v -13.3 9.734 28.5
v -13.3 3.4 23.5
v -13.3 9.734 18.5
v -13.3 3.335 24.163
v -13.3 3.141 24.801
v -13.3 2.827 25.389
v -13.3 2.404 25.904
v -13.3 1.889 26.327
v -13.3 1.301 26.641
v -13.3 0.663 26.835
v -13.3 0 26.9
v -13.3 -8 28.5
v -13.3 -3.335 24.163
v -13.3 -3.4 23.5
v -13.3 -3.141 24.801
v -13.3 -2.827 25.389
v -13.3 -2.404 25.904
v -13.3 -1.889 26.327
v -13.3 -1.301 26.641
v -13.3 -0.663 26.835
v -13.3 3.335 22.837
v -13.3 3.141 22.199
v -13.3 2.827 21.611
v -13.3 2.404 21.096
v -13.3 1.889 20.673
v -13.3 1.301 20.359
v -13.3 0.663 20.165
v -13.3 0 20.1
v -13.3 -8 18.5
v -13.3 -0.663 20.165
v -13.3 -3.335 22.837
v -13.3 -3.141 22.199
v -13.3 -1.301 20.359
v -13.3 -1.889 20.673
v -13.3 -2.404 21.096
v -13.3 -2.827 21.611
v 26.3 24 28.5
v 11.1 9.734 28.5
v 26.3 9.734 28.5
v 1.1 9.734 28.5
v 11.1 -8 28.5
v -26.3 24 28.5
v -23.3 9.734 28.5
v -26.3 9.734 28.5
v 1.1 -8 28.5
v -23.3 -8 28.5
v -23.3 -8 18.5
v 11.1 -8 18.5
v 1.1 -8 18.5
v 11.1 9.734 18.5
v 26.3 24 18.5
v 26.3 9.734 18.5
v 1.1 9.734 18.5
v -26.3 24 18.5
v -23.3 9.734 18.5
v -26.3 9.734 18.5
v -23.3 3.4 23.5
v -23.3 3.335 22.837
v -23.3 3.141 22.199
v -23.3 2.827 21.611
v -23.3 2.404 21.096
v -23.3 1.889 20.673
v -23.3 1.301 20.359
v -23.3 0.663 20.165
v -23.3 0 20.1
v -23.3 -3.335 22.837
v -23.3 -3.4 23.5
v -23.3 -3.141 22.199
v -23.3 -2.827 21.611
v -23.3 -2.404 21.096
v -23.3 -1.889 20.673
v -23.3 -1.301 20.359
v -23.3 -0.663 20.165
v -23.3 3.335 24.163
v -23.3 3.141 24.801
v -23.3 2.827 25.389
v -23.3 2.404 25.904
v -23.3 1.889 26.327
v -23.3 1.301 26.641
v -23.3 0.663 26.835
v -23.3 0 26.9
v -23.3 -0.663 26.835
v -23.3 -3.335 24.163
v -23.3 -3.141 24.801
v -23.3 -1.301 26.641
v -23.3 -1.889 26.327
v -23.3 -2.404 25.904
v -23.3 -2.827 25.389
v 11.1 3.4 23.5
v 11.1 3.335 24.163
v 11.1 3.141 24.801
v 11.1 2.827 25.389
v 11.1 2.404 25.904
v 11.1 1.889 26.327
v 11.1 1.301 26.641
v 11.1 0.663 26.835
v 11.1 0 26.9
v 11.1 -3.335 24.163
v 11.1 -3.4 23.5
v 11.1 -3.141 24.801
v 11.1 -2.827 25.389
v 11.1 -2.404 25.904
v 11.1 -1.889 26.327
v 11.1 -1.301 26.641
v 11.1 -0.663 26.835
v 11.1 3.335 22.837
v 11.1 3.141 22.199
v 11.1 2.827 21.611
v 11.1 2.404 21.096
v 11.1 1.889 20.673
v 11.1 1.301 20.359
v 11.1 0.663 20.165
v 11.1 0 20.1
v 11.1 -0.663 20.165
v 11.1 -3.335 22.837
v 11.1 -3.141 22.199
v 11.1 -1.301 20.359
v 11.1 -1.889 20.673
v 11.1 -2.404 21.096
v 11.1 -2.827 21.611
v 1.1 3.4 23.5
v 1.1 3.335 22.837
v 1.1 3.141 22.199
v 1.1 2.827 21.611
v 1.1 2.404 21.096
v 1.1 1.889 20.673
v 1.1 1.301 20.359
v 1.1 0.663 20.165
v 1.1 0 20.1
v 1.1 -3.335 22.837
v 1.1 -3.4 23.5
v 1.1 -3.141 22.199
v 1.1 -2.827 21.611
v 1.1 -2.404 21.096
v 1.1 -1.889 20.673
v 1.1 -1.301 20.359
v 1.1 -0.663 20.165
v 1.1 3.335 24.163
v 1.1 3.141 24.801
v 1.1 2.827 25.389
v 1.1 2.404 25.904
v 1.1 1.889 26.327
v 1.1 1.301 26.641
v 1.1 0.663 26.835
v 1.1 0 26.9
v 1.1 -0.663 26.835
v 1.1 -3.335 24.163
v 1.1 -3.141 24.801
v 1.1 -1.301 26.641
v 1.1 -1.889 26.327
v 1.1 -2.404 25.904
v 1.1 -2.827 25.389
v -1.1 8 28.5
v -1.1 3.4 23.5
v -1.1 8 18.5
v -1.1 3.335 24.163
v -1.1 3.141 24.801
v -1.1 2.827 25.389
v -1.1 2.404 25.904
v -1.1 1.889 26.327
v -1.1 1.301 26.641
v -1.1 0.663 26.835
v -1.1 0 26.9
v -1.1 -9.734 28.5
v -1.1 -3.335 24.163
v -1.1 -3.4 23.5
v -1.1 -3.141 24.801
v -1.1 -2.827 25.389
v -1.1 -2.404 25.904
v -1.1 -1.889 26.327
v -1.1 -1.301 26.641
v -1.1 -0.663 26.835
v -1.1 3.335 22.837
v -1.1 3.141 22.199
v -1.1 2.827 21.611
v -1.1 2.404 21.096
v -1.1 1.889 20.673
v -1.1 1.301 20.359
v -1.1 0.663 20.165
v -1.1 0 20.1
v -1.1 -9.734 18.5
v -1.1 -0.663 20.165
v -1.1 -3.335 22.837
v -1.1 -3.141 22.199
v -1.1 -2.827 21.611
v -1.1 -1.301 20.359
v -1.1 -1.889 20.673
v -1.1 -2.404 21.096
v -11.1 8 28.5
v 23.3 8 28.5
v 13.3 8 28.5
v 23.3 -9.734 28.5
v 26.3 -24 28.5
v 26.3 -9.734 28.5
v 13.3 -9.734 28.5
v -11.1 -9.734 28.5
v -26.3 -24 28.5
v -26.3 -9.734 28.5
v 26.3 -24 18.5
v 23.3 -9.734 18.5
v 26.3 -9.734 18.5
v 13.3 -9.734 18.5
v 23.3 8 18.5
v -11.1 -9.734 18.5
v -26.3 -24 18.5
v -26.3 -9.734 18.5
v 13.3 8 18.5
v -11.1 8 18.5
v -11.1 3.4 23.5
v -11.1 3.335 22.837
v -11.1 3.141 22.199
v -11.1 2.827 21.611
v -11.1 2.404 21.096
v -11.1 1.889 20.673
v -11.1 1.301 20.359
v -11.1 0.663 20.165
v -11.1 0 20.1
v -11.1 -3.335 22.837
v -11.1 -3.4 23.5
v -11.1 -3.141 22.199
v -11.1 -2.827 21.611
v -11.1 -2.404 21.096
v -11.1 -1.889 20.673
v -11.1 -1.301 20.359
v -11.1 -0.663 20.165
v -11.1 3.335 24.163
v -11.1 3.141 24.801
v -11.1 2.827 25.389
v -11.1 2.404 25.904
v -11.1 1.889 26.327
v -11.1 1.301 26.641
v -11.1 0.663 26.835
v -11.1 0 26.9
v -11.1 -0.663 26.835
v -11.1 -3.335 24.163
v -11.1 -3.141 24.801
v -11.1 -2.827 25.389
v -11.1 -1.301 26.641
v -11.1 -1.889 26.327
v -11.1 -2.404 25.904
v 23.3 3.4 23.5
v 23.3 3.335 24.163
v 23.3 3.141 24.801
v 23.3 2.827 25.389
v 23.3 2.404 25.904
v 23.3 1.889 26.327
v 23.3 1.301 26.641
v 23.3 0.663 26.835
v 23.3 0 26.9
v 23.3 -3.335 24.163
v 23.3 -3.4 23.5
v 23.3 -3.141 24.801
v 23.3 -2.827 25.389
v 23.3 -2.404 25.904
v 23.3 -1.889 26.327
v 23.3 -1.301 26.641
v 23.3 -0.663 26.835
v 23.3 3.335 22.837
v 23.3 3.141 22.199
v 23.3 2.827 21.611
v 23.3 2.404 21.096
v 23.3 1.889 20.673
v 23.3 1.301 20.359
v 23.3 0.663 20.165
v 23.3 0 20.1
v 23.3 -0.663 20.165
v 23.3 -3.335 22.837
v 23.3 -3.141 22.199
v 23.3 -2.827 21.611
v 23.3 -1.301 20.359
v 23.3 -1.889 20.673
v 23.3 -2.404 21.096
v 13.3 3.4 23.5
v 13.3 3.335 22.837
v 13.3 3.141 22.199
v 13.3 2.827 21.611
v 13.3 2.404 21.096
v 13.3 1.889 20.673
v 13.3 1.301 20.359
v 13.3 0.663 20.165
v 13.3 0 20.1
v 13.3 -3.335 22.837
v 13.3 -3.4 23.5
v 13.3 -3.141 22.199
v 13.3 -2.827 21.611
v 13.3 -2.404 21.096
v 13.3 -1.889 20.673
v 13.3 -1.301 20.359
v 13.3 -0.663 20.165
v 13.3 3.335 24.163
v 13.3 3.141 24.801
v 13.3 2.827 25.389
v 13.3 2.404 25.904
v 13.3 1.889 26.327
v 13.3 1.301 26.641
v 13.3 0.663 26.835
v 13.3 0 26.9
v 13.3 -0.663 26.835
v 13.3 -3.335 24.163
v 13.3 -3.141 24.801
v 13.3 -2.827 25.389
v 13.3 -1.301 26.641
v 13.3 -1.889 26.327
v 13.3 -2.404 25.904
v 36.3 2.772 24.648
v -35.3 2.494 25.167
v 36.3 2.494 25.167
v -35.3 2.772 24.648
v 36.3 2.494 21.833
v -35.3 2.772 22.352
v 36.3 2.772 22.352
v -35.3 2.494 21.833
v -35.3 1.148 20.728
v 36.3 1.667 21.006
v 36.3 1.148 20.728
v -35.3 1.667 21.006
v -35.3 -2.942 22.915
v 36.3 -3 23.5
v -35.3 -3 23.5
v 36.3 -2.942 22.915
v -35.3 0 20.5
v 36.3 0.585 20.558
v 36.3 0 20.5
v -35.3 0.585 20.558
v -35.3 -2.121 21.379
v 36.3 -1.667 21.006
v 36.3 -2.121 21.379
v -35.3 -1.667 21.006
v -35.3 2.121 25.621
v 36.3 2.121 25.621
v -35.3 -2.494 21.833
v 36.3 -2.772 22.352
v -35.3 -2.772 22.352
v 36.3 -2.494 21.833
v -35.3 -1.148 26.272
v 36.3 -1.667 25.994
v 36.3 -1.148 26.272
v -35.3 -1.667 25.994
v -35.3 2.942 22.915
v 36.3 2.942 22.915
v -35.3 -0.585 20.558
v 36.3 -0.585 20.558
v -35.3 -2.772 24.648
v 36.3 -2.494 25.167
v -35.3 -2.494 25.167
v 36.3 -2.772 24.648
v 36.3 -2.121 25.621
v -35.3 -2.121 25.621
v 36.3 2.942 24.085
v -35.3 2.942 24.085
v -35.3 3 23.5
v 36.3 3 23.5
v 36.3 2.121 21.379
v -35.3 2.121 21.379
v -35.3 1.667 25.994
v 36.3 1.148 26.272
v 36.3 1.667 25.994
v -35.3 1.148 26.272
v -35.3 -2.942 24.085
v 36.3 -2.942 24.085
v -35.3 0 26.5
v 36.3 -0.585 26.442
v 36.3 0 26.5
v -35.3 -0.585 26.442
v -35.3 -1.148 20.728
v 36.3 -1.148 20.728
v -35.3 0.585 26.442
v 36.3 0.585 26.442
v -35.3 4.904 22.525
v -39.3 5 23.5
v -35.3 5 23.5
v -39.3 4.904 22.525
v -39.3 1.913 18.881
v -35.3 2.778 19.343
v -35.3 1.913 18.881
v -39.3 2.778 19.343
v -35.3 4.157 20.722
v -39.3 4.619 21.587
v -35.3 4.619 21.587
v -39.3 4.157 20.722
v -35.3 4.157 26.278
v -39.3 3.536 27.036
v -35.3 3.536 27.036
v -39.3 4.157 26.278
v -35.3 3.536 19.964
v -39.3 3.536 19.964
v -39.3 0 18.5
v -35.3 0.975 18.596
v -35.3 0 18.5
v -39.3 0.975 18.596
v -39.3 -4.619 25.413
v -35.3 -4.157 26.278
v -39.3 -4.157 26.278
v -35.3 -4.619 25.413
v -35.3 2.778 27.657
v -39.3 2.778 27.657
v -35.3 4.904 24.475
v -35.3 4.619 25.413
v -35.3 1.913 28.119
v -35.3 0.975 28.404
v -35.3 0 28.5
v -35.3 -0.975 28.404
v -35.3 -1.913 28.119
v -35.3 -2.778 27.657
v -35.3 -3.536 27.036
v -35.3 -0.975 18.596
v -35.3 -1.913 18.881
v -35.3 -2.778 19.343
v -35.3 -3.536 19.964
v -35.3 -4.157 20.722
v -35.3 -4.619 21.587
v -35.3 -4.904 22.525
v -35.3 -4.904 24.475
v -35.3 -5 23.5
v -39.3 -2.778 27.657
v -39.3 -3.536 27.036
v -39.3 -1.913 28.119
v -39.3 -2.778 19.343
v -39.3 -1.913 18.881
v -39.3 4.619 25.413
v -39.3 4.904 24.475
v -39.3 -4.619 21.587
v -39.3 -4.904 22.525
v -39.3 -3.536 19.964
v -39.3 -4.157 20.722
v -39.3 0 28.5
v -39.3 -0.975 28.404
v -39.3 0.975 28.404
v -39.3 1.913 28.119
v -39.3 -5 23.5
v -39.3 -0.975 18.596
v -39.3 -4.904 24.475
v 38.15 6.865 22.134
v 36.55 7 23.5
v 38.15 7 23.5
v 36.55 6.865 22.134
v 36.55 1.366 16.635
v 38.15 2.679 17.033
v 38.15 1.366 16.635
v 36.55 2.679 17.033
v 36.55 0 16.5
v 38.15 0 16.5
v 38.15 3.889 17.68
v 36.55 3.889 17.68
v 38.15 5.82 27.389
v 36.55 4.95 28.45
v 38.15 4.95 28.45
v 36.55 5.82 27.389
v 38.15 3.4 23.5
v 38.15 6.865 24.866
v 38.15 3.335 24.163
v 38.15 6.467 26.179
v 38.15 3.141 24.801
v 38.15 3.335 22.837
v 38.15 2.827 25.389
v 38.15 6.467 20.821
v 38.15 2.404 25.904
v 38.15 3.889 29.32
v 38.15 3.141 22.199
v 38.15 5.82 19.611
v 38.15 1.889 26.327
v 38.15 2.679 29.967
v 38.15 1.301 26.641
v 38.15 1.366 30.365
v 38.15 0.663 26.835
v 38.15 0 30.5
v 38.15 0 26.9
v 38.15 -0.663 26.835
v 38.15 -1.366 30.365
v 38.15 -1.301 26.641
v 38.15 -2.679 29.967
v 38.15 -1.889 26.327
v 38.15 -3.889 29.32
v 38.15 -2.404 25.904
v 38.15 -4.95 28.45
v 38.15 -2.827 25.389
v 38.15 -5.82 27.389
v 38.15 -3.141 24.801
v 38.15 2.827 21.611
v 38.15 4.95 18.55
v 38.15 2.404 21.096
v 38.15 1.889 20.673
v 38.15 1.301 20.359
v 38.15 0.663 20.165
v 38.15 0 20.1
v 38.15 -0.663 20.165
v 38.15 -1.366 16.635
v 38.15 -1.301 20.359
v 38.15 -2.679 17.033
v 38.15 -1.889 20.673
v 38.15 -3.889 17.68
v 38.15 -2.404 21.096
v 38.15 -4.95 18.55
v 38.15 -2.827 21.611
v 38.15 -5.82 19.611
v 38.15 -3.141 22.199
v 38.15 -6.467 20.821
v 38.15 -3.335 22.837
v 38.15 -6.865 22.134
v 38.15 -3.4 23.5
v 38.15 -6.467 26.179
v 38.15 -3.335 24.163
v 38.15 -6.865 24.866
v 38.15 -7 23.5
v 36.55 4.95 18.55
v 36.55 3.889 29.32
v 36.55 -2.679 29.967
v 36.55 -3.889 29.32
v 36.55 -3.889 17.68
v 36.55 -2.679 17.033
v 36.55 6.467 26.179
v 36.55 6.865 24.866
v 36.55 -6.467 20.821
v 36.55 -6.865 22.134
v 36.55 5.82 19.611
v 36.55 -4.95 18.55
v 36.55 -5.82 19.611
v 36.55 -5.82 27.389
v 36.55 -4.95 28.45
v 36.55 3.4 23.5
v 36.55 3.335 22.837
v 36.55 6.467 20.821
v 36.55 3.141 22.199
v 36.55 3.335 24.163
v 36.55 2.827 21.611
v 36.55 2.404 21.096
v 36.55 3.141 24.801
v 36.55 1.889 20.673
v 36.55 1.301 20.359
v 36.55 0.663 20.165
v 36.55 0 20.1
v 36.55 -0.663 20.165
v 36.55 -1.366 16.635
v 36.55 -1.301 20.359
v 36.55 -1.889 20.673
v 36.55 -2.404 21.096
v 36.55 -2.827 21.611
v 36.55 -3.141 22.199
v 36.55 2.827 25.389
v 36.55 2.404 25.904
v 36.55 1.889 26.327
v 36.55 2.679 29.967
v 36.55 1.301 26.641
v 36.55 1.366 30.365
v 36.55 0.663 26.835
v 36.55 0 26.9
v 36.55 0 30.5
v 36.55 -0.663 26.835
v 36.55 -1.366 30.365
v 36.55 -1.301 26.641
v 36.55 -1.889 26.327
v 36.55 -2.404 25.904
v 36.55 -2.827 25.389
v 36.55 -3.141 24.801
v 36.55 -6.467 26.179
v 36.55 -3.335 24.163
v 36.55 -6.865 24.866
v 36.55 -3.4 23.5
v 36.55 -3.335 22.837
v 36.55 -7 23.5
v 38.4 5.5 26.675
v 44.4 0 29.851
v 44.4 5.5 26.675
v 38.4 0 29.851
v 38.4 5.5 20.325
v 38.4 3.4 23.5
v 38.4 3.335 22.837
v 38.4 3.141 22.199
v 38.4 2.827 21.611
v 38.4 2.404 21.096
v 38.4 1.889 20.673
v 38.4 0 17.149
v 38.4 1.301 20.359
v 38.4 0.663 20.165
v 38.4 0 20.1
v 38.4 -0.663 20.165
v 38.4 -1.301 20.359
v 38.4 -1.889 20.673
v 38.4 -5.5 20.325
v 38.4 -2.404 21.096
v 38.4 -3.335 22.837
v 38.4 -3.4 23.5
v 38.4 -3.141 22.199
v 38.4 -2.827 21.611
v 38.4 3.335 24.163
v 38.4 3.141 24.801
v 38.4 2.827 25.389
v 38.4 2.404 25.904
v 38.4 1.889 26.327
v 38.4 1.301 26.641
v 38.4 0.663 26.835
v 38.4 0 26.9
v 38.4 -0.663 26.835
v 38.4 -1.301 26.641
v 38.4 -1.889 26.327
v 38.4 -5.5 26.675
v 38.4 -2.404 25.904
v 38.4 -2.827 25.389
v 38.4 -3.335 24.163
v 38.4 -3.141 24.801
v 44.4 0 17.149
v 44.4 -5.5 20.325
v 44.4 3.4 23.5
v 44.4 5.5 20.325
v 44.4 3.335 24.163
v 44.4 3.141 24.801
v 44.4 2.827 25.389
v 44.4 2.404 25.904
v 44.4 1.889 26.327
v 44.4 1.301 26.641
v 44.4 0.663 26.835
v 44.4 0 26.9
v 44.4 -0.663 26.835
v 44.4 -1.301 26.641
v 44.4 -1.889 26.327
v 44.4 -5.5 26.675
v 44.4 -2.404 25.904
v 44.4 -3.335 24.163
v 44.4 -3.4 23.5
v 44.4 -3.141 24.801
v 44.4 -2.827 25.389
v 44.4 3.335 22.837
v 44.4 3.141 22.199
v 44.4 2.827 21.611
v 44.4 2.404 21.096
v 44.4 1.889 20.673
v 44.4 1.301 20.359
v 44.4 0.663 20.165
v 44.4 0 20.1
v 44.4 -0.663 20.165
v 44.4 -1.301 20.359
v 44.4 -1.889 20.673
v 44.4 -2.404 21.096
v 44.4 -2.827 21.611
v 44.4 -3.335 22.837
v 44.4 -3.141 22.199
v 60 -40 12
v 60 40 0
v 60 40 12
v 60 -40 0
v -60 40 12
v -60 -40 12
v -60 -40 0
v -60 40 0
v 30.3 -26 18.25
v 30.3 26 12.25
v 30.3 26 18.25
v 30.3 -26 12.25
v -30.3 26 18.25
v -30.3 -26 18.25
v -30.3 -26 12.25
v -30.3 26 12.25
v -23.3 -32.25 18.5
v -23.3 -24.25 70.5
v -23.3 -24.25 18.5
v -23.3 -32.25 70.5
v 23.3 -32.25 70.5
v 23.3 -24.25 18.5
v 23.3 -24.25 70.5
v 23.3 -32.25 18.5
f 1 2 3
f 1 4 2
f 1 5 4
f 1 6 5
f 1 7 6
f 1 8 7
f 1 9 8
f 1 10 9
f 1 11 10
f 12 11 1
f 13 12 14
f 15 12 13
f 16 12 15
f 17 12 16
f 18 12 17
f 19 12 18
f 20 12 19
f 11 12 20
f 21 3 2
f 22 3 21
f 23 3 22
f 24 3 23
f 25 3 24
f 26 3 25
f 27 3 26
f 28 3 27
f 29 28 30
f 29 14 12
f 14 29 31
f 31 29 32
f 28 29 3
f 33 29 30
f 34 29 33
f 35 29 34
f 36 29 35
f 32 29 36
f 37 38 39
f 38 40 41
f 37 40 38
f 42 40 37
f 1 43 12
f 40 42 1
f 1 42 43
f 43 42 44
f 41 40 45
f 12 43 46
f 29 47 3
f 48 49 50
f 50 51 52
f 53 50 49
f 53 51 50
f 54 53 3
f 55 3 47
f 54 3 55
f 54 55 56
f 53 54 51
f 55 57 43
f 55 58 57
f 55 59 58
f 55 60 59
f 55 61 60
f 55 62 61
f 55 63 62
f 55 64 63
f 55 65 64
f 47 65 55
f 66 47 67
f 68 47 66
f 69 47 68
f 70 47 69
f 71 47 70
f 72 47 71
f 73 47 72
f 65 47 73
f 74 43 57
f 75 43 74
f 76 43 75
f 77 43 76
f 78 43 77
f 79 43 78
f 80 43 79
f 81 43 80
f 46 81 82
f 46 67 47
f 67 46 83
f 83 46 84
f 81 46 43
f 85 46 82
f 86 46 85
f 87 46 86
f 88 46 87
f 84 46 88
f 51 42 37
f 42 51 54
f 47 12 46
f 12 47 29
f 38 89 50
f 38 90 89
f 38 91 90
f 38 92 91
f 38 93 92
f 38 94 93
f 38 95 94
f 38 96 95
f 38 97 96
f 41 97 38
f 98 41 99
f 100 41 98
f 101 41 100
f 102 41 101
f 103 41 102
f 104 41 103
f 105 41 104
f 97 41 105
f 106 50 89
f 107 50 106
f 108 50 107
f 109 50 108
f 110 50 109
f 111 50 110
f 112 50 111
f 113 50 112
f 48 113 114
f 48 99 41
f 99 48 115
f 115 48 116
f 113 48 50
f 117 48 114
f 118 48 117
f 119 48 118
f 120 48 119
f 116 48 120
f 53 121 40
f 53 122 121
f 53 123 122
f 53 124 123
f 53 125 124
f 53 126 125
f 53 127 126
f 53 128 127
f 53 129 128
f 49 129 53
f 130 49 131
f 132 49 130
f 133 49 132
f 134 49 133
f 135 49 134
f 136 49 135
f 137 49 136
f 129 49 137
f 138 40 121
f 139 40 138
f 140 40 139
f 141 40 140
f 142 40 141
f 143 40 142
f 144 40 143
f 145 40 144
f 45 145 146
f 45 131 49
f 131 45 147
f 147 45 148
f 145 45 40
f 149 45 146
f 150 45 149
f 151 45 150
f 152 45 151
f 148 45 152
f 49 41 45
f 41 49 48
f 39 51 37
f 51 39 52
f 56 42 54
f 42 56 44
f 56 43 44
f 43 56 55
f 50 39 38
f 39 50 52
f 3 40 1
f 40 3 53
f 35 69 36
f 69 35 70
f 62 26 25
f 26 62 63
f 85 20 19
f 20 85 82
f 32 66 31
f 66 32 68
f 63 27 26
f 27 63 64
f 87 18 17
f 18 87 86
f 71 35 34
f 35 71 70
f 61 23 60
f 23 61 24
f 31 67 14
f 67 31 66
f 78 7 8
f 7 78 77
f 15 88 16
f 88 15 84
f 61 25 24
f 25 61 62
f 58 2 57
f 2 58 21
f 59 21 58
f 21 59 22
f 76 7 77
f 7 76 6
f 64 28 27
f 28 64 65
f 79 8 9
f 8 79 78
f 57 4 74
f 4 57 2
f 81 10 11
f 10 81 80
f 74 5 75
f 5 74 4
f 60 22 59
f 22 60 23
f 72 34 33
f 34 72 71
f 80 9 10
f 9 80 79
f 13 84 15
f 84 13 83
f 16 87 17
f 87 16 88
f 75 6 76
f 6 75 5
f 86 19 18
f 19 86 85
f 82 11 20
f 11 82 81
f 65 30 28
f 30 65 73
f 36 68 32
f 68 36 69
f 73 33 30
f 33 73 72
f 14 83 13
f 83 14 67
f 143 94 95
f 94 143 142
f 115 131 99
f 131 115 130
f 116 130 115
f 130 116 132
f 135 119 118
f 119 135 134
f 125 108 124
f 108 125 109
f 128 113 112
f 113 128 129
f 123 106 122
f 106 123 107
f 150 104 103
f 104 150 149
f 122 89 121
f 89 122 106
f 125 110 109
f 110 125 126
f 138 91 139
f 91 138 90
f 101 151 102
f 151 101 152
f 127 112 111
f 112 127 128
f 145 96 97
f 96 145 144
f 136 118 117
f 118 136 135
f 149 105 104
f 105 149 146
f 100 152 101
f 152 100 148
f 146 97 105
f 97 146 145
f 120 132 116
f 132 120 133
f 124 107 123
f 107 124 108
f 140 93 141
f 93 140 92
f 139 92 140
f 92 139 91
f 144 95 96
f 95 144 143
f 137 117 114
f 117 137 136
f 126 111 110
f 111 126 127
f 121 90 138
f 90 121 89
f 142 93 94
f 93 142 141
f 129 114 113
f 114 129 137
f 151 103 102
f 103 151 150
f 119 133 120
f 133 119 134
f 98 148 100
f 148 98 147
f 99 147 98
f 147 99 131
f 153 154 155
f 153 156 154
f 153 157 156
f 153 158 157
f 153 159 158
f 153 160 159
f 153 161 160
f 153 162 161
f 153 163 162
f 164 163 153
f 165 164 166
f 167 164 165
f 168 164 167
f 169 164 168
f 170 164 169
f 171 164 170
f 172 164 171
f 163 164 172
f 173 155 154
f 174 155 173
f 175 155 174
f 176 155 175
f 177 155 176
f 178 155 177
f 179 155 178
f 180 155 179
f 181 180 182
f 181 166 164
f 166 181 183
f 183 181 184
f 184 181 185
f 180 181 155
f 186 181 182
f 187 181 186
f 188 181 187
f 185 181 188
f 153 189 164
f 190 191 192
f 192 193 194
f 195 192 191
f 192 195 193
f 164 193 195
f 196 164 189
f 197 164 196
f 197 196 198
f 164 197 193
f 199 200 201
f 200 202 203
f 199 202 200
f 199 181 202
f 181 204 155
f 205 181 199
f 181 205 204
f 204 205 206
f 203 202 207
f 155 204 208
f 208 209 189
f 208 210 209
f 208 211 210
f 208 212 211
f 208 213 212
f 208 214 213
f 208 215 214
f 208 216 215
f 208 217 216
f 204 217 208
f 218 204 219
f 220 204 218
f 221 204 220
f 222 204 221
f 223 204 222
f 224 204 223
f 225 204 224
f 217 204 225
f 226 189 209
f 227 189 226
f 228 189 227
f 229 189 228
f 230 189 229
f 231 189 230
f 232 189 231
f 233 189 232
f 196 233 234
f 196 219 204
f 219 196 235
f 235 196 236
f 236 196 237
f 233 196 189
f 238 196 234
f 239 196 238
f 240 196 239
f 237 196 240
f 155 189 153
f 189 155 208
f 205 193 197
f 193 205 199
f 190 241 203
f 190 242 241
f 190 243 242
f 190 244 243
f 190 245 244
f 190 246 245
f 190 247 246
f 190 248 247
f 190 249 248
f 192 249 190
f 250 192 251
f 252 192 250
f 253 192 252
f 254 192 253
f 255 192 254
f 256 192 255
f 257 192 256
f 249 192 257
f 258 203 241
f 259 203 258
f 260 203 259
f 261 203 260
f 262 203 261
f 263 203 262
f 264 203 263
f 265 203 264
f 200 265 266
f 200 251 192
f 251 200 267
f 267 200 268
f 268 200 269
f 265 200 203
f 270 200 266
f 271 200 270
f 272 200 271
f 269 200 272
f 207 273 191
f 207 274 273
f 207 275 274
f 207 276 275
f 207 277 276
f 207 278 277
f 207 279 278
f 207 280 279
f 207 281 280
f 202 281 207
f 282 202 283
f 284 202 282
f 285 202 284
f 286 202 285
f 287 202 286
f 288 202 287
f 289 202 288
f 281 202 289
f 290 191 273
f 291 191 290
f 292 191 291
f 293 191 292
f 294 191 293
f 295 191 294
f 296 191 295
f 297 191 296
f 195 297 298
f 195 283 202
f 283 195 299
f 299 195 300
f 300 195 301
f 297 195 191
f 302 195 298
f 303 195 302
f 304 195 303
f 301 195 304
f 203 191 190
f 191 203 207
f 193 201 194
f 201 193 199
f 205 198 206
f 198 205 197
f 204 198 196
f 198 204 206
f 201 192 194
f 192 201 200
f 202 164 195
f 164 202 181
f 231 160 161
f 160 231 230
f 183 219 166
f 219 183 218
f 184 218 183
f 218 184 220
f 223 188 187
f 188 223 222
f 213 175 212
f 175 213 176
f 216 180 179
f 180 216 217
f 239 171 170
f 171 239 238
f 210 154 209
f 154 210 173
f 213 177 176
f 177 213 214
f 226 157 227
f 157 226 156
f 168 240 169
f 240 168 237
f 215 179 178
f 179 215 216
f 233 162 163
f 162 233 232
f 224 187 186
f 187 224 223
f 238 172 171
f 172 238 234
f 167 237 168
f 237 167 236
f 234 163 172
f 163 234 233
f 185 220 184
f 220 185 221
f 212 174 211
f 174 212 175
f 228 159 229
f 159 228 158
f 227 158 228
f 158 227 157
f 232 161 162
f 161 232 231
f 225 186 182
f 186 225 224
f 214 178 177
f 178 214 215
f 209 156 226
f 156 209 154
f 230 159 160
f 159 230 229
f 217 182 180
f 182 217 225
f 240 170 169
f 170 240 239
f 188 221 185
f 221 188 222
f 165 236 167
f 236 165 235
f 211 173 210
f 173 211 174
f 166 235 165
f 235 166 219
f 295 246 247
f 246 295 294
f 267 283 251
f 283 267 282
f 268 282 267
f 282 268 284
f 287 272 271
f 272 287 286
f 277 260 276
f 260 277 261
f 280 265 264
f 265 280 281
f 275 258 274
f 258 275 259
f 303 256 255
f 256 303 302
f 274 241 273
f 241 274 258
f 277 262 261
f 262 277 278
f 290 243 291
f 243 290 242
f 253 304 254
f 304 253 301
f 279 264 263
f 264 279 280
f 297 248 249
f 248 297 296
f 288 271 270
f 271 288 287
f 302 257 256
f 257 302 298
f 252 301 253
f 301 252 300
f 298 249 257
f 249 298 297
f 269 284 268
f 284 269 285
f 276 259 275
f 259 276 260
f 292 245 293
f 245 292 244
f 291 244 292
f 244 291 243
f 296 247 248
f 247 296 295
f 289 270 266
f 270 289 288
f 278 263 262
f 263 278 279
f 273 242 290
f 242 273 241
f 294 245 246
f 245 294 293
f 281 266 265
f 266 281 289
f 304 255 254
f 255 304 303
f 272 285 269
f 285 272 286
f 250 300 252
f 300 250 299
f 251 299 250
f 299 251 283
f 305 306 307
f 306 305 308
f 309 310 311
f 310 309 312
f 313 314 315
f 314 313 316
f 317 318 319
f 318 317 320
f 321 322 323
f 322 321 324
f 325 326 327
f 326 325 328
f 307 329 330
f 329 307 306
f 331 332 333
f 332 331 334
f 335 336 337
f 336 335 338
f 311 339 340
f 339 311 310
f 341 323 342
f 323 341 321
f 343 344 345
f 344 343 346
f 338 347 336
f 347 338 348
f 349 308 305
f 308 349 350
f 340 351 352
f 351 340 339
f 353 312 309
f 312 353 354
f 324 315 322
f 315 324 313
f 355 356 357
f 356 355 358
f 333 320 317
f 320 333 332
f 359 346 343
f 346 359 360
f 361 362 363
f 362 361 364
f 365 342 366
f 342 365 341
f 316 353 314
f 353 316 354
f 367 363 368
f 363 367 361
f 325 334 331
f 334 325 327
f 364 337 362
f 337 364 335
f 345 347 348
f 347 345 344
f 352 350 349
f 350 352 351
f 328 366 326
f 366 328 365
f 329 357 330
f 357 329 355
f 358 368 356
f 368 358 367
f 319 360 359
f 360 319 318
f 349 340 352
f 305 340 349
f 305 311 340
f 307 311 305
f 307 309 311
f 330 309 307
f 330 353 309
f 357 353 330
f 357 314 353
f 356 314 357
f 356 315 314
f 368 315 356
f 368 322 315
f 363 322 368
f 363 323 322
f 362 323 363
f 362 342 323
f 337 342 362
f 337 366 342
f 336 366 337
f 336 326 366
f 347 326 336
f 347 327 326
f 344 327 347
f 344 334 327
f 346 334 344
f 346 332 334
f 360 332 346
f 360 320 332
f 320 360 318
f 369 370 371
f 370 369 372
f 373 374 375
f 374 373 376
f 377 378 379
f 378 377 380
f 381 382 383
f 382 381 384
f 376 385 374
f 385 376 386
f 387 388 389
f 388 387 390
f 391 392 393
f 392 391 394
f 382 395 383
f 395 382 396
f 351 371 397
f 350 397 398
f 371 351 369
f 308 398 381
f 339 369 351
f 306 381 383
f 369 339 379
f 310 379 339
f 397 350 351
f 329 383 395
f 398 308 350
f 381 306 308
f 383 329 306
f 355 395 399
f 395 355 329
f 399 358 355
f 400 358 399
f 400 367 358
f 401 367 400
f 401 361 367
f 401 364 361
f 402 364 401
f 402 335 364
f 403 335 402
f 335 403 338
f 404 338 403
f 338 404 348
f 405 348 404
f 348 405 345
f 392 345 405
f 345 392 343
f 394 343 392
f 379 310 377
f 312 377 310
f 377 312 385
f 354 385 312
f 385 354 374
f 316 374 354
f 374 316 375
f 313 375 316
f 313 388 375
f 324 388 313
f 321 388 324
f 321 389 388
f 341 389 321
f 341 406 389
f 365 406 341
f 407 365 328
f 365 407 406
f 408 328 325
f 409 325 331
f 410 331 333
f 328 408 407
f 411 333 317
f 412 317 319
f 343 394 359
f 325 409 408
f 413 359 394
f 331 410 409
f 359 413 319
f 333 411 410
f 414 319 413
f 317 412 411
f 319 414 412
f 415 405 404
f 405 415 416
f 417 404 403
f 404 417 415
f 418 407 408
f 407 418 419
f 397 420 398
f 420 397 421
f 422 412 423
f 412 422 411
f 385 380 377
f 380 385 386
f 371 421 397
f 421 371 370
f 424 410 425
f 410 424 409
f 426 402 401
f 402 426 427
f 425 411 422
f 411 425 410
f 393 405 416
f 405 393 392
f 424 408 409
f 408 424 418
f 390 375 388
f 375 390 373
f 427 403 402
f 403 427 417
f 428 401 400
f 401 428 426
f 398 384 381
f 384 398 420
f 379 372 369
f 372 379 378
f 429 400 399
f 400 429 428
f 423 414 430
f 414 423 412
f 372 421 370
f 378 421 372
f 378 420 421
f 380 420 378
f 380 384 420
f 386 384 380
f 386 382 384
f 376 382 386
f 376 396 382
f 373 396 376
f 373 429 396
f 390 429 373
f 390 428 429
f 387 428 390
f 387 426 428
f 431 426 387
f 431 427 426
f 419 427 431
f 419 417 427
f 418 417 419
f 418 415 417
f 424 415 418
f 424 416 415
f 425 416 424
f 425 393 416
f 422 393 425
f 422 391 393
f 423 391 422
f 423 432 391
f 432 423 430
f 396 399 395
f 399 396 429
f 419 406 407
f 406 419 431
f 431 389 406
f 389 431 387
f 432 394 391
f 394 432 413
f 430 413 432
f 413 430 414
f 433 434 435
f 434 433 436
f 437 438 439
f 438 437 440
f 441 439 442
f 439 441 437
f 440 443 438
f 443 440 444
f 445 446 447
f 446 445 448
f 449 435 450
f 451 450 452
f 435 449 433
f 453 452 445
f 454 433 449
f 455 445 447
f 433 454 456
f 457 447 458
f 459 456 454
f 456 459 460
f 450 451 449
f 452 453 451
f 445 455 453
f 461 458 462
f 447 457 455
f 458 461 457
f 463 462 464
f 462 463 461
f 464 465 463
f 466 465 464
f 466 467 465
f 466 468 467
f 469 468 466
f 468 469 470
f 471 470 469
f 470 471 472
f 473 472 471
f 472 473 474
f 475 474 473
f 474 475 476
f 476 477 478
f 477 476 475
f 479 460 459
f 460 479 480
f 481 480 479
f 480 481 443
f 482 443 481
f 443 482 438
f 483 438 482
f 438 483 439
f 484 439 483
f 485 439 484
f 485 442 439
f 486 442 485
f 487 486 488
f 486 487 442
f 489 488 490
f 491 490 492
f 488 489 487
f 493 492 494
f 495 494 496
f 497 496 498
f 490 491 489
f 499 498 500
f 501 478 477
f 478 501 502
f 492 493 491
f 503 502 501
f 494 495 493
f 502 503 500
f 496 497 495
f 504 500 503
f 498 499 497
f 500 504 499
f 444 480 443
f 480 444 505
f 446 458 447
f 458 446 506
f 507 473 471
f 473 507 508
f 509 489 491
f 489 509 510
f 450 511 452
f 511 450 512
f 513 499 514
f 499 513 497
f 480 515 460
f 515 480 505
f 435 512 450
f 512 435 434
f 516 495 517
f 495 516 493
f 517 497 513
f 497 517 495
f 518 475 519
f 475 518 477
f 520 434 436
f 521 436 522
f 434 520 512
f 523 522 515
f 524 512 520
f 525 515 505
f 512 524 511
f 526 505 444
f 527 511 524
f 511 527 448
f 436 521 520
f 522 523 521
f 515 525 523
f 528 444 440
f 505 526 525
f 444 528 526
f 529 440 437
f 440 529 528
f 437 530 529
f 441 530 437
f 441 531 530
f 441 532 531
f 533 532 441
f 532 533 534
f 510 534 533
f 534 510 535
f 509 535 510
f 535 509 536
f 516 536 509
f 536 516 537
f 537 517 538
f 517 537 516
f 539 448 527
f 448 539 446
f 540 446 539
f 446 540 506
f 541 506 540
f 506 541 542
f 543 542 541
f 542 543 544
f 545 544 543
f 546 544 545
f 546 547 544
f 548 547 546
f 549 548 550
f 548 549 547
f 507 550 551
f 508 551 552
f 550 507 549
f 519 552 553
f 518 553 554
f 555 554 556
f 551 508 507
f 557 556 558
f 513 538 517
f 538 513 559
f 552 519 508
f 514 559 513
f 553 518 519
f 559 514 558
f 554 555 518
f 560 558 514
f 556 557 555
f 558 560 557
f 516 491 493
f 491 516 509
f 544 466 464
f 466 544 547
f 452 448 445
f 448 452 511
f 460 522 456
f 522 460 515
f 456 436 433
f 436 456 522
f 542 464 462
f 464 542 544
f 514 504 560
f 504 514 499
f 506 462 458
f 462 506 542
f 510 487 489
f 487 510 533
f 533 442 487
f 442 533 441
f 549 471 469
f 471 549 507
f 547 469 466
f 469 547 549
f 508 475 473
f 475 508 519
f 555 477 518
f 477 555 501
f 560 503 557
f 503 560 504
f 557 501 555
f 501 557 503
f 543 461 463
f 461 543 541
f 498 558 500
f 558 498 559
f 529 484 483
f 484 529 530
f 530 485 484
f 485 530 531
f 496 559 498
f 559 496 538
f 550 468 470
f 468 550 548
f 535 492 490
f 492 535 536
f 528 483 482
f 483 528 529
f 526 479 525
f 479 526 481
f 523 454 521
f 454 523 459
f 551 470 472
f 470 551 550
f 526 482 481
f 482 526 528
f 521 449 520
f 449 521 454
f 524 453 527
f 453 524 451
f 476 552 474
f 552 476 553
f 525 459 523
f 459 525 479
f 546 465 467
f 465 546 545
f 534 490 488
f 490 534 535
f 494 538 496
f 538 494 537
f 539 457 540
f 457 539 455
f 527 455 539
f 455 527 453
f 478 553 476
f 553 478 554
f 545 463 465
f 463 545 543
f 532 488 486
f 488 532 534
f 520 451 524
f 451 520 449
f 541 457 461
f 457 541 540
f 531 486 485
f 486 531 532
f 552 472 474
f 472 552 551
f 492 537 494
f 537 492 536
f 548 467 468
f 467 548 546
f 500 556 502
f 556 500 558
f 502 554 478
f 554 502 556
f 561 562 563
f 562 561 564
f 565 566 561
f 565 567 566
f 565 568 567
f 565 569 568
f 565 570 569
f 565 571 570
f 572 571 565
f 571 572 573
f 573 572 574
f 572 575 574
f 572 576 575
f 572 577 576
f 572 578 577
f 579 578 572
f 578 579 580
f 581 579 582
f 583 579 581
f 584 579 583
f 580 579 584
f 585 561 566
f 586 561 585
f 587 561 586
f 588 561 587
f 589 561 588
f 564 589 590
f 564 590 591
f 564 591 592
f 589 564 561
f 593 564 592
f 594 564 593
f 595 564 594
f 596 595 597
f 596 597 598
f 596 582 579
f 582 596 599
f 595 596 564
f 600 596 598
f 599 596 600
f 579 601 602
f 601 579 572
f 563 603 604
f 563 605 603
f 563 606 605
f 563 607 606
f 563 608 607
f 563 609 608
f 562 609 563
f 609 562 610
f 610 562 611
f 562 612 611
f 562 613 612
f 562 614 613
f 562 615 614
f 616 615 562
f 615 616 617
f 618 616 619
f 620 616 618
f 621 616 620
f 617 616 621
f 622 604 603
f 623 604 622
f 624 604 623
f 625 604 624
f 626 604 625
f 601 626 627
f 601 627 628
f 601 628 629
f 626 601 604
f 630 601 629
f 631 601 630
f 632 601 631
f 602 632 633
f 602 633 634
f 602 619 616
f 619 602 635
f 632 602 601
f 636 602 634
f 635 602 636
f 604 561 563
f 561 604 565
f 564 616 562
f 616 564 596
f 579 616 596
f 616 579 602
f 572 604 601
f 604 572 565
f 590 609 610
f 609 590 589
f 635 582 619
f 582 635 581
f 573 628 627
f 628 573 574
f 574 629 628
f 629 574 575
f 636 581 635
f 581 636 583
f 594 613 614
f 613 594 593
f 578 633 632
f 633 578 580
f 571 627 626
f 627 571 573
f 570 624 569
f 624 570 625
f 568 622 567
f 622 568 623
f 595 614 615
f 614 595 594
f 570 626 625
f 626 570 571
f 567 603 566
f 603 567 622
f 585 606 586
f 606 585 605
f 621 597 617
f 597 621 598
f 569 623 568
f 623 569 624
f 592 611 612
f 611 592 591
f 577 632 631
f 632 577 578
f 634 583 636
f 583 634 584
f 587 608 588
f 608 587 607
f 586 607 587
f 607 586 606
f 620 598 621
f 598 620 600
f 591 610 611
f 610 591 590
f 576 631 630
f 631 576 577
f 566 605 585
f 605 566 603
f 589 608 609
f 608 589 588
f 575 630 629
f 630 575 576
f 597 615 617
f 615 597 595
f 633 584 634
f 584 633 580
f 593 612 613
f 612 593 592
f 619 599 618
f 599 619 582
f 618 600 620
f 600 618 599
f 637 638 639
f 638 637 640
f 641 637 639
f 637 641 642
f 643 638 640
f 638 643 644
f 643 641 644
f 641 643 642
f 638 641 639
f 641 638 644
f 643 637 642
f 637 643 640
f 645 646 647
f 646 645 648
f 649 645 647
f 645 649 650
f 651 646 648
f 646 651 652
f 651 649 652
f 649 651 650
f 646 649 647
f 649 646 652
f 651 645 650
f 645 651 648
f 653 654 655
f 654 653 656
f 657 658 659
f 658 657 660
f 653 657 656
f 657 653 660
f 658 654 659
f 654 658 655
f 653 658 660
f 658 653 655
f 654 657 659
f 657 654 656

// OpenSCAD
$fn = 32;

// ------------------------------------------------------------------------
// Comb hinge with flap: leaf 52.6 x 24 mm, pin d6, flap 52 mm
// Every part is its own module, assembly() places every instance.
// ------------------------------------------------------------------------

// --- part 1 ---
module hinge_bed() {
  difference() {
    translate([-60, -40, 0]) cube([120, 80, 12]);
  }
}

// --- part 2 ---
module hinge_riser() {
  difference() {
    translate([-30.3, -26, 0]) cube([60.6, 52, 6]);
  }
}

// --- part 3 ---
module hinge_leaf_a() {
  difference() {
    union() {
      translate([-23.3, -8, -5]) cube([10, 32, 10]);
      translate([1.1, -8, -5]) cube([10, 32, 10]);
      translate([-26.3, 9.734, -5]) cube([52.6, 14.266, 10]);
    }
    translate([-18.3, 0, 0]) rotate([0, 90, 0]) cylinder(h = 12, d = 6.8, center = true);
    translate([6.1, 0, 0]) rotate([0, 90, 0]) cylinder(h = 12, d = 6.8, center = true);
  }
}

// --- part 4 ---
module hinge_leaf_b() {
  difference() {
    union() {
      translate([-11.1, -24, -5]) cube([10, 32, 10]);
      translate([13.3, -24, -5]) cube([10, 32, 10]);
      translate([-26.3, -24, -5]) cube([52.6, 14.266, 10]);
    }
    translate([-6.1, 0, 0]) rotate([0, 90, 0]) cylinder(h = 12, d = 6.8, center = true);
    translate([18.3, 0, 0]) rotate([0, 90, 0]) cylinder(h = 12, d = 6.8, center = true);
  }
}

// --- part 5 ---
module hinge_flap() {
  difference() {
    translate([-23.3, -26, 0]) cube([46.6, 52, 8]);
  }
}

// --- part 6 ---
module hinge_pin() {
  rotate([0, 90, 0]) cylinder(h = 72.6, d = 6, center = true);
  translate([-39.3, 0, 0]) rotate([0, 90, 0]) cylinder(h = 4, d = 10);
}

// --- part 7 ---
module pin_washer() {
  difference() {
      translate([0, 0, 0]) cylinder(h = 1.6, d = 14);
      translate([0, 0, -1]) cylinder(h = 3.6, d = 6.8);
    }
}

// --- part 8 ---
module pin_nut() {
  difference() {
    linear_extrude(height = 6) polygon(points = [[6.351, 0], [3.175, 5.5], [-3.175, 5.5], [-6.351, 0], [-3.175, -5.5], [3.175, -5.5]]);
    translate([0, 0, -1]) cylinder(h = 8, d = 6.8);
  }
}

// --- assembly ---
module assembly() {
  color([0.80, 0.24, 0.20]) translate([0, 0, 0]) rotate([0, 0, 0]) hinge_bed();
  color([0.20, 0.45, 0.75]) translate([0, 0, 12.25]) rotate([0, 0, 0]) hinge_riser();
  color([0.25, 0.62, 0.32]) translate([0, 0, 23.5]) rotate([0, 0, 0]) hinge_leaf_a();
  color([0.92, 0.70, 0.18]) translate([0, 0, 23.5]) rotate([0, 0, 0]) hinge_leaf_b();
  color([0.58, 0.35, 0.70]) translate([0, -24.25, 44.5]) rotate([90, 0, 0]) hinge_flap();
  color([0.16, 0.66, 0.66]) translate([0, 0, 23.5]) rotate([0, 0, 0]) hinge_pin();
  color([0.85, 0.48, 0.18]) translate([36.55, 0, 23.5]) rotate([0, 90, 0]) pin_washer();
  color([0.55, 0.60, 0.65]) translate([38.4, 0, 23.5]) rotate([0, 90, 0]) pin_nut();
}

assembly();
